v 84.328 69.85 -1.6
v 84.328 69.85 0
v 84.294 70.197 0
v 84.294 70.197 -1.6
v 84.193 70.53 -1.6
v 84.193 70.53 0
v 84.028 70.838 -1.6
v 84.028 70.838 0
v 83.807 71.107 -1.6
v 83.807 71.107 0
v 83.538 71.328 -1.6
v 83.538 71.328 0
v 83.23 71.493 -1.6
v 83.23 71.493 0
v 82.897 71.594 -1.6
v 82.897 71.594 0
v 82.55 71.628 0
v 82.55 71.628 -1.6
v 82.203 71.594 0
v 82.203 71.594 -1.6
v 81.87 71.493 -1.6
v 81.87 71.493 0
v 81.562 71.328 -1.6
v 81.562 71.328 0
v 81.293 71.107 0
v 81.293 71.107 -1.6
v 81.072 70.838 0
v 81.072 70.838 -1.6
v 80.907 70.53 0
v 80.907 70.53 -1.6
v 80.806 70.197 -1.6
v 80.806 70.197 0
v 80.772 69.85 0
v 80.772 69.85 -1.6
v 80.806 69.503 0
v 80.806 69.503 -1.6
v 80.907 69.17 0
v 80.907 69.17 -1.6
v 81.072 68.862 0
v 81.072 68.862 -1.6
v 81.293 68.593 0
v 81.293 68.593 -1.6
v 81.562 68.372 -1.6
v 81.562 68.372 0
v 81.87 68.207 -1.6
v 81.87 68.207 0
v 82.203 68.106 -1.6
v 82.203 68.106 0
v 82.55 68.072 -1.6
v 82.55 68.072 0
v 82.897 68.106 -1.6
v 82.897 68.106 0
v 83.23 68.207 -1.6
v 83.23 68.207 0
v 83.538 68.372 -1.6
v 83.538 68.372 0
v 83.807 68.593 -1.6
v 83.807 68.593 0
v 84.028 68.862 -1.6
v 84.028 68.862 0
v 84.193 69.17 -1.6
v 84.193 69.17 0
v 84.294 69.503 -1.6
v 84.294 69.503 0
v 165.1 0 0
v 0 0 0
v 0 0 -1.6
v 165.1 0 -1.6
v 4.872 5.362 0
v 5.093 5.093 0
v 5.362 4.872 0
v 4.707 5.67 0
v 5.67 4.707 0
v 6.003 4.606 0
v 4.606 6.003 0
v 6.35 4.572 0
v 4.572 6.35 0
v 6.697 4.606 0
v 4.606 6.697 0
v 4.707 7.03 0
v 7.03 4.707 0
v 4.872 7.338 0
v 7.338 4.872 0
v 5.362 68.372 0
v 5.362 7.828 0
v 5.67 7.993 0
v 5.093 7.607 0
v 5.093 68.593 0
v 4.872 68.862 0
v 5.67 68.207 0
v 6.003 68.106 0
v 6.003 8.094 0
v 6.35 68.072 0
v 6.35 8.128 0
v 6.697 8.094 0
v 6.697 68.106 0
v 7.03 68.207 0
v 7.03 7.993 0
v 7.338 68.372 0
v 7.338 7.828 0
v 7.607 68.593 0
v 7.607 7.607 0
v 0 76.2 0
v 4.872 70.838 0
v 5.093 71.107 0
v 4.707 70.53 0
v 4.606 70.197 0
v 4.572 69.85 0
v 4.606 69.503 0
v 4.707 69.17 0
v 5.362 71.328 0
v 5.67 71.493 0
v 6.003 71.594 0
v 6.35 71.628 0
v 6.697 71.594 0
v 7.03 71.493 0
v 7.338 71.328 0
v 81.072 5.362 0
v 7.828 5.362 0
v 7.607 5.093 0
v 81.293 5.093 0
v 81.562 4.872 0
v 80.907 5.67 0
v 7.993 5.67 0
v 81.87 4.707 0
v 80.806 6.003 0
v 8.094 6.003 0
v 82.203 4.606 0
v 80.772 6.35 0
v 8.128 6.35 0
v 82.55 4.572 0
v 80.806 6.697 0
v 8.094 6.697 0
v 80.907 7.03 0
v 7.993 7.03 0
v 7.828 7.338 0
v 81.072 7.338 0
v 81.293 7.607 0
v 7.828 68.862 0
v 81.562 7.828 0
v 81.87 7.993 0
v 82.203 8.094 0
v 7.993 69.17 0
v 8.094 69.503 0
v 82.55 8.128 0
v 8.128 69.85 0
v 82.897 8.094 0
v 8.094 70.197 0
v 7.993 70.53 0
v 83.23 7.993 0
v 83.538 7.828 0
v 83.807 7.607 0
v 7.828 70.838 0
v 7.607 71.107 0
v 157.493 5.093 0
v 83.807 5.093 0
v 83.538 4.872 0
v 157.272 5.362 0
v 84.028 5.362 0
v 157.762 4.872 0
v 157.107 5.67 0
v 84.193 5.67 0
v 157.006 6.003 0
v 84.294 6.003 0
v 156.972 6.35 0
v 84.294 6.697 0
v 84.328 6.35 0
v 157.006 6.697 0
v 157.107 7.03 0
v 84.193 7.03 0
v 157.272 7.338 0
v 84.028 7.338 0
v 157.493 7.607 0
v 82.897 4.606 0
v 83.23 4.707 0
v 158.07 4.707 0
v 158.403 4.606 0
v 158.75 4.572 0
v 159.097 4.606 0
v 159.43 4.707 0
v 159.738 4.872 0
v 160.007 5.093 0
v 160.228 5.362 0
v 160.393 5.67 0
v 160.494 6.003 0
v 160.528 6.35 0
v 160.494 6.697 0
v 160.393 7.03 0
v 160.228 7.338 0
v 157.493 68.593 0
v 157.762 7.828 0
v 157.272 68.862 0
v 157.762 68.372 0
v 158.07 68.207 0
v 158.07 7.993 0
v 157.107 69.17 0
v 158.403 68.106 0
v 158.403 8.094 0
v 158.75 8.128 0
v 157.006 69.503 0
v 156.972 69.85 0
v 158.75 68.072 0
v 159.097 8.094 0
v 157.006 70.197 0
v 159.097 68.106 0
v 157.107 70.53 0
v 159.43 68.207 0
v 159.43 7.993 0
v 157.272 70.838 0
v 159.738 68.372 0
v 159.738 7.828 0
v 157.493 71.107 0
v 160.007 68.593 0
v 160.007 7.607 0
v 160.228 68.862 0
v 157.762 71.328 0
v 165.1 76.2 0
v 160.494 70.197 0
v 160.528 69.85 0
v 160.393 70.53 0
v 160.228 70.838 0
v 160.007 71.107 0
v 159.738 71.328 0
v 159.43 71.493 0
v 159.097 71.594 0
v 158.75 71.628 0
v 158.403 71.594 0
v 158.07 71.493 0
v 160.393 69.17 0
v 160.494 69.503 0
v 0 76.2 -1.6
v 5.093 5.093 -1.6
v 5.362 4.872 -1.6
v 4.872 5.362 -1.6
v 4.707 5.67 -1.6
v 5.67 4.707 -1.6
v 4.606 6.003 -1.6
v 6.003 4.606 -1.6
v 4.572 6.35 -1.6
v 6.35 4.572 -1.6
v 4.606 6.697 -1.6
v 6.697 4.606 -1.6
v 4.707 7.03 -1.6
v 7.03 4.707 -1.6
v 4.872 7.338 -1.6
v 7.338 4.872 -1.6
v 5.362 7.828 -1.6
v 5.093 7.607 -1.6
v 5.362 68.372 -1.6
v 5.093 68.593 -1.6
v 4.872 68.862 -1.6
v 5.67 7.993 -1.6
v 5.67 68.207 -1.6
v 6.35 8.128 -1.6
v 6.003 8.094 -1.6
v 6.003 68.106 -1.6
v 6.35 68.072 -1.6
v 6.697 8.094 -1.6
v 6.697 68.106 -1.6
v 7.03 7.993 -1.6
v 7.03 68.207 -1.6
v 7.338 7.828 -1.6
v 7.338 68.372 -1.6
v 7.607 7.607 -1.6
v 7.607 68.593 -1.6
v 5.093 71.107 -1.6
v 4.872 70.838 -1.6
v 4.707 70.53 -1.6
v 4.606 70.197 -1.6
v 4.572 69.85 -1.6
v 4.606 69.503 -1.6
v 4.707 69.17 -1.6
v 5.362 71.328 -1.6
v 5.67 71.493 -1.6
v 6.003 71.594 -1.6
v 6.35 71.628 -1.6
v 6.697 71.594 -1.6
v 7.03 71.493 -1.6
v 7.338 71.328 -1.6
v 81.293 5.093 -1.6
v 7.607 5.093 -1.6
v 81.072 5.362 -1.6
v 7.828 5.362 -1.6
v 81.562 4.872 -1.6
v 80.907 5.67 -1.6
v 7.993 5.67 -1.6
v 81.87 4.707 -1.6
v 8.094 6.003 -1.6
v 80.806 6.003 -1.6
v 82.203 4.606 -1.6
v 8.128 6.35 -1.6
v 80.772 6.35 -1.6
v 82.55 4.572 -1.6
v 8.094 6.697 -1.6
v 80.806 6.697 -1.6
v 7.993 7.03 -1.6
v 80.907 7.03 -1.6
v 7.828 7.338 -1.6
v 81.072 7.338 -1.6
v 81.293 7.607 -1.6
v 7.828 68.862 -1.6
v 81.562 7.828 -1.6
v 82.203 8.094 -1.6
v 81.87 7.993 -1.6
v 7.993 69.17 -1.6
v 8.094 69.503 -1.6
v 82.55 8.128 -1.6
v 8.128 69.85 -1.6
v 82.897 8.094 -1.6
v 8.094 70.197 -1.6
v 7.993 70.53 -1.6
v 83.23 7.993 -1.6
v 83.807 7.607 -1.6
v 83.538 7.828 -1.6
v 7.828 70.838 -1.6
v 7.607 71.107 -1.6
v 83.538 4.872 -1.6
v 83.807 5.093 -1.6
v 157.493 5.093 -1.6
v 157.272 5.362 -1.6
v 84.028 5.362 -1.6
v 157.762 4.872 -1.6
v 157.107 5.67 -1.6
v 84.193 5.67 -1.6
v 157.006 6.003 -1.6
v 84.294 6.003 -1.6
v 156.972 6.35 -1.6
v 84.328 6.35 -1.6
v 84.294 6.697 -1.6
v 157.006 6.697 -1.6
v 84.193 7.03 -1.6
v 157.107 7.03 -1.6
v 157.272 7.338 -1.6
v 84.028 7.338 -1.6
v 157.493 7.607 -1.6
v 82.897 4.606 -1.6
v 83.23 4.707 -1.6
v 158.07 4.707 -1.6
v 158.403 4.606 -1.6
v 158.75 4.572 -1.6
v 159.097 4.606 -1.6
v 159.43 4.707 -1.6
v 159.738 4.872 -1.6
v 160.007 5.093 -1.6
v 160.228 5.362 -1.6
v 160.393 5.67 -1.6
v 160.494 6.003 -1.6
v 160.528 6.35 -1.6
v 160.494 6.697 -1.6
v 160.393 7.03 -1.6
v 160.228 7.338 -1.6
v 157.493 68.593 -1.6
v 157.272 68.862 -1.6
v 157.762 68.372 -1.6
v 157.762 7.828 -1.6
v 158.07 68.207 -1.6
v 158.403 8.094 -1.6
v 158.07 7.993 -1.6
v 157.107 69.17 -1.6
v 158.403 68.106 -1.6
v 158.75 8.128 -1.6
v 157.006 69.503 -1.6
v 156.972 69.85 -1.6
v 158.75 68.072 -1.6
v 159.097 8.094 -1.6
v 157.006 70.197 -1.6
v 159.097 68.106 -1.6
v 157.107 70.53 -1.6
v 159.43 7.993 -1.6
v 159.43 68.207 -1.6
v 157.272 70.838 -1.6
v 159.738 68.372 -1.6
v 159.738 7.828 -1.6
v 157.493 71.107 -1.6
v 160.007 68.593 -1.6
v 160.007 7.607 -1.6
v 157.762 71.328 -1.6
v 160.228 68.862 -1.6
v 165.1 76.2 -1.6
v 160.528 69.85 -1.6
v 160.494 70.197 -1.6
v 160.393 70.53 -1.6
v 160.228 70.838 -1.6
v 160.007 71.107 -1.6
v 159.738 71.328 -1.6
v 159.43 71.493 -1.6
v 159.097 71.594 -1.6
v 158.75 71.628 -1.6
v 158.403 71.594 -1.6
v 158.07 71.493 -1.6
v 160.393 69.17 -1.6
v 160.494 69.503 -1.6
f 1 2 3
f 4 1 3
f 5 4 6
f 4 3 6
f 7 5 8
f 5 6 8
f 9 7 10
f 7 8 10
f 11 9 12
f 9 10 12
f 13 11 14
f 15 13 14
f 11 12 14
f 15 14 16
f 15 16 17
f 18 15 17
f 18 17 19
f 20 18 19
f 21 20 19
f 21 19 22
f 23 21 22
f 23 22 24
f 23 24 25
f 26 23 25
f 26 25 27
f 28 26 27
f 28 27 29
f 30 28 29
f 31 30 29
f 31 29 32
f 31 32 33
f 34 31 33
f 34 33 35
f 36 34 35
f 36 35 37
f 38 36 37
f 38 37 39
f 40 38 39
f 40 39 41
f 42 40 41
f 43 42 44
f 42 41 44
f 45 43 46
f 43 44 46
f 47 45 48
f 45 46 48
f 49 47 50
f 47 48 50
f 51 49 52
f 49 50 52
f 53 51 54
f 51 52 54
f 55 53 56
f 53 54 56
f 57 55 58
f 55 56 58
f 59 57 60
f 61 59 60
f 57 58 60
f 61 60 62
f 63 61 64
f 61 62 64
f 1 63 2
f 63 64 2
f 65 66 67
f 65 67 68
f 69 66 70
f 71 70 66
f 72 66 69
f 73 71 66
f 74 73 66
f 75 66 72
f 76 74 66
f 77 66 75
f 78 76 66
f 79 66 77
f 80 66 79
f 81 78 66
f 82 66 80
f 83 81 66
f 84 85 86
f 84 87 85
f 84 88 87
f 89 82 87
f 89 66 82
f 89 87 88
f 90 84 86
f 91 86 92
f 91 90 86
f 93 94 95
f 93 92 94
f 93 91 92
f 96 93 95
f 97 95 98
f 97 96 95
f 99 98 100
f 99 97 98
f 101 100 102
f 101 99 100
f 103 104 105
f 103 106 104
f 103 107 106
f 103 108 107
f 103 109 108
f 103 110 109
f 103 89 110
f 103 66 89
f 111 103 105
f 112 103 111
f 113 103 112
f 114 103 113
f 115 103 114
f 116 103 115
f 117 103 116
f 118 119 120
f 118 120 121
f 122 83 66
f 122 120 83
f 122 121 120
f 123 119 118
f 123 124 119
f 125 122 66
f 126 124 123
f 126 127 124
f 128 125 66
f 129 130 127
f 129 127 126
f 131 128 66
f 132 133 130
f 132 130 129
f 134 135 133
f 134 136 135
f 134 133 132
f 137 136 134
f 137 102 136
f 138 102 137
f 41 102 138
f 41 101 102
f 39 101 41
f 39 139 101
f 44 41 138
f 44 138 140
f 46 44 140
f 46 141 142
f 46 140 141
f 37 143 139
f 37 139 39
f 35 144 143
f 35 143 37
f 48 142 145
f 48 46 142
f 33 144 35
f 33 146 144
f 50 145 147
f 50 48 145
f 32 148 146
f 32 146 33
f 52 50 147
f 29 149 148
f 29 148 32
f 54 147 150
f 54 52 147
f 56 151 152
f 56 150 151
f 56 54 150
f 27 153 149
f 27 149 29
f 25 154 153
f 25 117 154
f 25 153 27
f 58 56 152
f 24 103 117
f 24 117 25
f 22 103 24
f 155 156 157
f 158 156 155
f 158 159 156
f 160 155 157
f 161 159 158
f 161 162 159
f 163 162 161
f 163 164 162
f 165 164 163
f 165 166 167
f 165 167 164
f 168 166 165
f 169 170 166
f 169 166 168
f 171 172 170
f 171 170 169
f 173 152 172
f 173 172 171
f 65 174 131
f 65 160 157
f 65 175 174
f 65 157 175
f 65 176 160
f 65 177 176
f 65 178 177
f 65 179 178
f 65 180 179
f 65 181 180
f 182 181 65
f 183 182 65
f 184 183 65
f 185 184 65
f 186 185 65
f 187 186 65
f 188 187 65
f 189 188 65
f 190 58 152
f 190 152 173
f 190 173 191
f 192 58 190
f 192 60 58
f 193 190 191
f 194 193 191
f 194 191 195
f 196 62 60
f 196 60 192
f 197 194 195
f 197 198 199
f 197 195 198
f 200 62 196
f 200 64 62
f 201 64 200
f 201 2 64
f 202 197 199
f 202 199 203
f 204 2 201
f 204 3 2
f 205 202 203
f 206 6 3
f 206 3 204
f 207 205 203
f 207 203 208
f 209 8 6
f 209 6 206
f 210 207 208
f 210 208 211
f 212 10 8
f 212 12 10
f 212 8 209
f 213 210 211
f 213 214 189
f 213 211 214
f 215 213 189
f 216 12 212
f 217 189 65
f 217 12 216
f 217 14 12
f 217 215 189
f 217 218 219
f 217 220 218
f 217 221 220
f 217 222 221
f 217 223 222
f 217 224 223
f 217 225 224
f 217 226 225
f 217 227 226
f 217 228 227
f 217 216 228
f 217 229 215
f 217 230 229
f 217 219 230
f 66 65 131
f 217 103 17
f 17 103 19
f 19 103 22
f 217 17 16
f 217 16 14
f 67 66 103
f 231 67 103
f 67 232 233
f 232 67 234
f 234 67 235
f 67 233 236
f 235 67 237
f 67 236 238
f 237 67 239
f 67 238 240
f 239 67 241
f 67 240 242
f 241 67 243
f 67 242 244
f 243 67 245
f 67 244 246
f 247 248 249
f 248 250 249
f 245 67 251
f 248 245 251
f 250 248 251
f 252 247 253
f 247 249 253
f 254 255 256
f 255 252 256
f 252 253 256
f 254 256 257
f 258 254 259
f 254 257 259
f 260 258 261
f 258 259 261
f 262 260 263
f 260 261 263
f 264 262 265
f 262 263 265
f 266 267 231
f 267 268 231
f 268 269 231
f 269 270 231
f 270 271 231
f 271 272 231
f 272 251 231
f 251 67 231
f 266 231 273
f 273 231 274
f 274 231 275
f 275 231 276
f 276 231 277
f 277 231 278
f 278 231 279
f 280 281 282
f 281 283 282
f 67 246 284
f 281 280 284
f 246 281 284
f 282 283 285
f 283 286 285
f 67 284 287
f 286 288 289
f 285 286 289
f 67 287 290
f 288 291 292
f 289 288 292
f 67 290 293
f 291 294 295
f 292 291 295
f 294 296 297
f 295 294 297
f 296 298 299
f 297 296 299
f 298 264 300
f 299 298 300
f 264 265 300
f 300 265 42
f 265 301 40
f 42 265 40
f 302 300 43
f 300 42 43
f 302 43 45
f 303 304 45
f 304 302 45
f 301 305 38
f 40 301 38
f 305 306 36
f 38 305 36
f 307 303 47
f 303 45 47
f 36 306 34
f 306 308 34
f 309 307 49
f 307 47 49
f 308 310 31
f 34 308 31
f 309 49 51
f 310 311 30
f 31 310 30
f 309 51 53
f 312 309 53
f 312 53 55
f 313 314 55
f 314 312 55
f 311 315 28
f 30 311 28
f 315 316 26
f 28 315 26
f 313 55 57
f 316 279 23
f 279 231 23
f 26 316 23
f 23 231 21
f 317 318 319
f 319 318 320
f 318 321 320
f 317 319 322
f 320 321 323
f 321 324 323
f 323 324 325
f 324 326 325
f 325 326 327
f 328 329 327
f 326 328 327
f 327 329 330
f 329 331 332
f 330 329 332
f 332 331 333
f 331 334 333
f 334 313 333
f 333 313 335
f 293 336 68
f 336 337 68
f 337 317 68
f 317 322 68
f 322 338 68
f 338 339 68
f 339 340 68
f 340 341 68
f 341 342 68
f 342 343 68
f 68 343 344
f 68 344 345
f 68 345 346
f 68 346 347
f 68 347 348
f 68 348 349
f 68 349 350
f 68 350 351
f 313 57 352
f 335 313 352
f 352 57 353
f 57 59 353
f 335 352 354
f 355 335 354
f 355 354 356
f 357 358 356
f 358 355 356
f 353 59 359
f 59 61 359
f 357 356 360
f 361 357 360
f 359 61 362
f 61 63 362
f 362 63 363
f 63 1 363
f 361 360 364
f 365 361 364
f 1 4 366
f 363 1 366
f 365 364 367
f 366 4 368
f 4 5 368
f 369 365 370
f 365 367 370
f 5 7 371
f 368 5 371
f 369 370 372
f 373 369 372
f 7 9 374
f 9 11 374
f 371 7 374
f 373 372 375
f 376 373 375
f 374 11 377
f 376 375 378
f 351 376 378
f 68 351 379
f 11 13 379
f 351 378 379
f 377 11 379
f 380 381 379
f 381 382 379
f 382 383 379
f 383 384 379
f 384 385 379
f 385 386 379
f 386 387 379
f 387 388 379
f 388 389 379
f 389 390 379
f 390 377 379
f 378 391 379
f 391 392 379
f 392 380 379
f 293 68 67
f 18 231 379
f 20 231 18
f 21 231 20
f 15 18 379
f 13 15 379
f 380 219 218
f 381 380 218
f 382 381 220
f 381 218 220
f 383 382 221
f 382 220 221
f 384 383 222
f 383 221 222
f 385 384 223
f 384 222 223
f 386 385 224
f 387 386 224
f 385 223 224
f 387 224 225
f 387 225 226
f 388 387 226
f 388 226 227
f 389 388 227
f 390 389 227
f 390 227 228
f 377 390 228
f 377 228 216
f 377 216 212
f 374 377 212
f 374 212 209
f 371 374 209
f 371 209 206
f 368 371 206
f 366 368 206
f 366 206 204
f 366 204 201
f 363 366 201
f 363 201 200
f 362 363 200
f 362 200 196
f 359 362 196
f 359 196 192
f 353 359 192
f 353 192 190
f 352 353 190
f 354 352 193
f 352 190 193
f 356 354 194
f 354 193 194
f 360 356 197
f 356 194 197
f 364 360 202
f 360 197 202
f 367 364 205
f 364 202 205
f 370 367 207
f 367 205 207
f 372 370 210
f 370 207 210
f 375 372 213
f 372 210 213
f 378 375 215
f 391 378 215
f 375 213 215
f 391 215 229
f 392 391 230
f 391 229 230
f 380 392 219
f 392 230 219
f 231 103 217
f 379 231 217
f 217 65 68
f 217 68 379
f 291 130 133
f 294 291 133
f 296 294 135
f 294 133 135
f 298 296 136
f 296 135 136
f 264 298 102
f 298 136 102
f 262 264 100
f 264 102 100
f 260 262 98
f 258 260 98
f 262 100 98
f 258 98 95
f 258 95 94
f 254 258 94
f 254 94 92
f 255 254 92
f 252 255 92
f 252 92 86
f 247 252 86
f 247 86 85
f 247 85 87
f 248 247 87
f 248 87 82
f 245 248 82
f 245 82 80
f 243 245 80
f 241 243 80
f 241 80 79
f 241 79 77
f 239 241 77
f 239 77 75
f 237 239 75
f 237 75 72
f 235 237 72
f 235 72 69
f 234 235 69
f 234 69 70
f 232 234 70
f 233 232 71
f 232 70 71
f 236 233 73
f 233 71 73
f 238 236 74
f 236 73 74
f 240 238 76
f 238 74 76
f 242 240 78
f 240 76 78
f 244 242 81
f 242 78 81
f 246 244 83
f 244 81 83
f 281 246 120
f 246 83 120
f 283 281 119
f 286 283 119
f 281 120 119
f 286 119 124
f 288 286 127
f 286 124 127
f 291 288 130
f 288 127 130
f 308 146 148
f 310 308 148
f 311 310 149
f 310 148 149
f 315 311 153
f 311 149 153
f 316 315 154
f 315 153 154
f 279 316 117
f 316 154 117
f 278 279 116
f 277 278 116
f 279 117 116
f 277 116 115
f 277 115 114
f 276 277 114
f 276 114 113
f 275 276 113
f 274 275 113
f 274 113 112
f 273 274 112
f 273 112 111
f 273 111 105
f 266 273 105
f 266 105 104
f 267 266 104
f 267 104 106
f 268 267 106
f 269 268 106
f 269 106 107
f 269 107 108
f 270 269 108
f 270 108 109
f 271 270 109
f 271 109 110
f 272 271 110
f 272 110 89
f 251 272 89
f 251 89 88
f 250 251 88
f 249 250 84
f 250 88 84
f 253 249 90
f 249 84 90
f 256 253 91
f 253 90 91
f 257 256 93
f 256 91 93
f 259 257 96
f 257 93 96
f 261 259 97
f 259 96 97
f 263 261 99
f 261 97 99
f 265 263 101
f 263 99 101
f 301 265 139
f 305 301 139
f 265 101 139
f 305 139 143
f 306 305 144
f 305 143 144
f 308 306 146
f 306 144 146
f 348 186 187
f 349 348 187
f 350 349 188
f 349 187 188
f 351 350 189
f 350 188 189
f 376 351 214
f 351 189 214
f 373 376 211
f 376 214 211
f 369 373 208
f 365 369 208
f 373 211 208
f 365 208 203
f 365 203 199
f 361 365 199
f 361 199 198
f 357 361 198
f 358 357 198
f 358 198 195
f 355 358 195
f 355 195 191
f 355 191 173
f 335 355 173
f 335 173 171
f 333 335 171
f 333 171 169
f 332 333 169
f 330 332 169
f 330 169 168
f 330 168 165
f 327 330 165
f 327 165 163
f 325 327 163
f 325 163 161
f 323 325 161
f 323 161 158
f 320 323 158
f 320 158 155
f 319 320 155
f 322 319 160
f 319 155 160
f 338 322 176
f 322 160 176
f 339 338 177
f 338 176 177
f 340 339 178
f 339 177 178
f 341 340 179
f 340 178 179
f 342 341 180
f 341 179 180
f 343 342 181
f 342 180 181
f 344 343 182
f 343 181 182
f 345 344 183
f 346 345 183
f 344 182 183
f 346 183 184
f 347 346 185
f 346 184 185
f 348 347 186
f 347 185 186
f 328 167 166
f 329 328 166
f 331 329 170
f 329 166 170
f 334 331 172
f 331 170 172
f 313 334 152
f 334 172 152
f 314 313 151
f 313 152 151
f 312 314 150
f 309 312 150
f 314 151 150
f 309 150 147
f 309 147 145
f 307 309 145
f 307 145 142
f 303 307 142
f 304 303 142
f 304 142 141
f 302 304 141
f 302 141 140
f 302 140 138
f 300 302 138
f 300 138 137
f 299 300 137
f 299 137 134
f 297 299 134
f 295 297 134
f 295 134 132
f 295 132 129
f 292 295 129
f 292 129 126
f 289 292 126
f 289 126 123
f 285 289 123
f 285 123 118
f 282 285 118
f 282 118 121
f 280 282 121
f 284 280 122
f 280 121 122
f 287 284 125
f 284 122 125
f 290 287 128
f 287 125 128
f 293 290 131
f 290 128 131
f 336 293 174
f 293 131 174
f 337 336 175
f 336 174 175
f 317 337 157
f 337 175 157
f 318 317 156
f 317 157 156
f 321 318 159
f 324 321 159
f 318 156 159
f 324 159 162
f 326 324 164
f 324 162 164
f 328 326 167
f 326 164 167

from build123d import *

# Parameters (mm, degrees)
SKETCH1_W          = 165.1
SKETCH1_H          = 76.2
EXTRUDE1_DEPTH     = 1.6002
SKETCH2_R          = 1.778
CUT_EXTRUDE1_DEPTH = 2.54


with BuildPart() as part:
    # Sketch1 → Extrude1 (new body)
    with BuildSketch(Plane.XY):
        with Locations((82.55, 38.1)):
            Rectangle(SKETCH1_W, SKETCH1_H)
    extrude(amount=-EXTRUDE1_DEPTH)

    # Sketch2 → Cut-Extrude1 (cut)
    with BuildSketch(Plane.XY):
        with Locations((6.35, 69.85)):
            Circle(SKETCH2_R)
        with Locations((158.75, 69.85)):
            Circle(SKETCH2_R)
        with Locations((158.75, 6.35)):
            Circle(SKETCH2_R)
        with Locations((6.35, 6.35)):
            Circle(SKETCH2_R)
        with Locations((82.55, 6.35)):
            Circle(SKETCH2_R)
        with Locations((82.55, 69.85)):
            Circle(SKETCH2_R)
    extrude(amount=-CUT_EXTRUDE1_DEPTH, mode=Mode.SUBTRACT)


solid = part.part
